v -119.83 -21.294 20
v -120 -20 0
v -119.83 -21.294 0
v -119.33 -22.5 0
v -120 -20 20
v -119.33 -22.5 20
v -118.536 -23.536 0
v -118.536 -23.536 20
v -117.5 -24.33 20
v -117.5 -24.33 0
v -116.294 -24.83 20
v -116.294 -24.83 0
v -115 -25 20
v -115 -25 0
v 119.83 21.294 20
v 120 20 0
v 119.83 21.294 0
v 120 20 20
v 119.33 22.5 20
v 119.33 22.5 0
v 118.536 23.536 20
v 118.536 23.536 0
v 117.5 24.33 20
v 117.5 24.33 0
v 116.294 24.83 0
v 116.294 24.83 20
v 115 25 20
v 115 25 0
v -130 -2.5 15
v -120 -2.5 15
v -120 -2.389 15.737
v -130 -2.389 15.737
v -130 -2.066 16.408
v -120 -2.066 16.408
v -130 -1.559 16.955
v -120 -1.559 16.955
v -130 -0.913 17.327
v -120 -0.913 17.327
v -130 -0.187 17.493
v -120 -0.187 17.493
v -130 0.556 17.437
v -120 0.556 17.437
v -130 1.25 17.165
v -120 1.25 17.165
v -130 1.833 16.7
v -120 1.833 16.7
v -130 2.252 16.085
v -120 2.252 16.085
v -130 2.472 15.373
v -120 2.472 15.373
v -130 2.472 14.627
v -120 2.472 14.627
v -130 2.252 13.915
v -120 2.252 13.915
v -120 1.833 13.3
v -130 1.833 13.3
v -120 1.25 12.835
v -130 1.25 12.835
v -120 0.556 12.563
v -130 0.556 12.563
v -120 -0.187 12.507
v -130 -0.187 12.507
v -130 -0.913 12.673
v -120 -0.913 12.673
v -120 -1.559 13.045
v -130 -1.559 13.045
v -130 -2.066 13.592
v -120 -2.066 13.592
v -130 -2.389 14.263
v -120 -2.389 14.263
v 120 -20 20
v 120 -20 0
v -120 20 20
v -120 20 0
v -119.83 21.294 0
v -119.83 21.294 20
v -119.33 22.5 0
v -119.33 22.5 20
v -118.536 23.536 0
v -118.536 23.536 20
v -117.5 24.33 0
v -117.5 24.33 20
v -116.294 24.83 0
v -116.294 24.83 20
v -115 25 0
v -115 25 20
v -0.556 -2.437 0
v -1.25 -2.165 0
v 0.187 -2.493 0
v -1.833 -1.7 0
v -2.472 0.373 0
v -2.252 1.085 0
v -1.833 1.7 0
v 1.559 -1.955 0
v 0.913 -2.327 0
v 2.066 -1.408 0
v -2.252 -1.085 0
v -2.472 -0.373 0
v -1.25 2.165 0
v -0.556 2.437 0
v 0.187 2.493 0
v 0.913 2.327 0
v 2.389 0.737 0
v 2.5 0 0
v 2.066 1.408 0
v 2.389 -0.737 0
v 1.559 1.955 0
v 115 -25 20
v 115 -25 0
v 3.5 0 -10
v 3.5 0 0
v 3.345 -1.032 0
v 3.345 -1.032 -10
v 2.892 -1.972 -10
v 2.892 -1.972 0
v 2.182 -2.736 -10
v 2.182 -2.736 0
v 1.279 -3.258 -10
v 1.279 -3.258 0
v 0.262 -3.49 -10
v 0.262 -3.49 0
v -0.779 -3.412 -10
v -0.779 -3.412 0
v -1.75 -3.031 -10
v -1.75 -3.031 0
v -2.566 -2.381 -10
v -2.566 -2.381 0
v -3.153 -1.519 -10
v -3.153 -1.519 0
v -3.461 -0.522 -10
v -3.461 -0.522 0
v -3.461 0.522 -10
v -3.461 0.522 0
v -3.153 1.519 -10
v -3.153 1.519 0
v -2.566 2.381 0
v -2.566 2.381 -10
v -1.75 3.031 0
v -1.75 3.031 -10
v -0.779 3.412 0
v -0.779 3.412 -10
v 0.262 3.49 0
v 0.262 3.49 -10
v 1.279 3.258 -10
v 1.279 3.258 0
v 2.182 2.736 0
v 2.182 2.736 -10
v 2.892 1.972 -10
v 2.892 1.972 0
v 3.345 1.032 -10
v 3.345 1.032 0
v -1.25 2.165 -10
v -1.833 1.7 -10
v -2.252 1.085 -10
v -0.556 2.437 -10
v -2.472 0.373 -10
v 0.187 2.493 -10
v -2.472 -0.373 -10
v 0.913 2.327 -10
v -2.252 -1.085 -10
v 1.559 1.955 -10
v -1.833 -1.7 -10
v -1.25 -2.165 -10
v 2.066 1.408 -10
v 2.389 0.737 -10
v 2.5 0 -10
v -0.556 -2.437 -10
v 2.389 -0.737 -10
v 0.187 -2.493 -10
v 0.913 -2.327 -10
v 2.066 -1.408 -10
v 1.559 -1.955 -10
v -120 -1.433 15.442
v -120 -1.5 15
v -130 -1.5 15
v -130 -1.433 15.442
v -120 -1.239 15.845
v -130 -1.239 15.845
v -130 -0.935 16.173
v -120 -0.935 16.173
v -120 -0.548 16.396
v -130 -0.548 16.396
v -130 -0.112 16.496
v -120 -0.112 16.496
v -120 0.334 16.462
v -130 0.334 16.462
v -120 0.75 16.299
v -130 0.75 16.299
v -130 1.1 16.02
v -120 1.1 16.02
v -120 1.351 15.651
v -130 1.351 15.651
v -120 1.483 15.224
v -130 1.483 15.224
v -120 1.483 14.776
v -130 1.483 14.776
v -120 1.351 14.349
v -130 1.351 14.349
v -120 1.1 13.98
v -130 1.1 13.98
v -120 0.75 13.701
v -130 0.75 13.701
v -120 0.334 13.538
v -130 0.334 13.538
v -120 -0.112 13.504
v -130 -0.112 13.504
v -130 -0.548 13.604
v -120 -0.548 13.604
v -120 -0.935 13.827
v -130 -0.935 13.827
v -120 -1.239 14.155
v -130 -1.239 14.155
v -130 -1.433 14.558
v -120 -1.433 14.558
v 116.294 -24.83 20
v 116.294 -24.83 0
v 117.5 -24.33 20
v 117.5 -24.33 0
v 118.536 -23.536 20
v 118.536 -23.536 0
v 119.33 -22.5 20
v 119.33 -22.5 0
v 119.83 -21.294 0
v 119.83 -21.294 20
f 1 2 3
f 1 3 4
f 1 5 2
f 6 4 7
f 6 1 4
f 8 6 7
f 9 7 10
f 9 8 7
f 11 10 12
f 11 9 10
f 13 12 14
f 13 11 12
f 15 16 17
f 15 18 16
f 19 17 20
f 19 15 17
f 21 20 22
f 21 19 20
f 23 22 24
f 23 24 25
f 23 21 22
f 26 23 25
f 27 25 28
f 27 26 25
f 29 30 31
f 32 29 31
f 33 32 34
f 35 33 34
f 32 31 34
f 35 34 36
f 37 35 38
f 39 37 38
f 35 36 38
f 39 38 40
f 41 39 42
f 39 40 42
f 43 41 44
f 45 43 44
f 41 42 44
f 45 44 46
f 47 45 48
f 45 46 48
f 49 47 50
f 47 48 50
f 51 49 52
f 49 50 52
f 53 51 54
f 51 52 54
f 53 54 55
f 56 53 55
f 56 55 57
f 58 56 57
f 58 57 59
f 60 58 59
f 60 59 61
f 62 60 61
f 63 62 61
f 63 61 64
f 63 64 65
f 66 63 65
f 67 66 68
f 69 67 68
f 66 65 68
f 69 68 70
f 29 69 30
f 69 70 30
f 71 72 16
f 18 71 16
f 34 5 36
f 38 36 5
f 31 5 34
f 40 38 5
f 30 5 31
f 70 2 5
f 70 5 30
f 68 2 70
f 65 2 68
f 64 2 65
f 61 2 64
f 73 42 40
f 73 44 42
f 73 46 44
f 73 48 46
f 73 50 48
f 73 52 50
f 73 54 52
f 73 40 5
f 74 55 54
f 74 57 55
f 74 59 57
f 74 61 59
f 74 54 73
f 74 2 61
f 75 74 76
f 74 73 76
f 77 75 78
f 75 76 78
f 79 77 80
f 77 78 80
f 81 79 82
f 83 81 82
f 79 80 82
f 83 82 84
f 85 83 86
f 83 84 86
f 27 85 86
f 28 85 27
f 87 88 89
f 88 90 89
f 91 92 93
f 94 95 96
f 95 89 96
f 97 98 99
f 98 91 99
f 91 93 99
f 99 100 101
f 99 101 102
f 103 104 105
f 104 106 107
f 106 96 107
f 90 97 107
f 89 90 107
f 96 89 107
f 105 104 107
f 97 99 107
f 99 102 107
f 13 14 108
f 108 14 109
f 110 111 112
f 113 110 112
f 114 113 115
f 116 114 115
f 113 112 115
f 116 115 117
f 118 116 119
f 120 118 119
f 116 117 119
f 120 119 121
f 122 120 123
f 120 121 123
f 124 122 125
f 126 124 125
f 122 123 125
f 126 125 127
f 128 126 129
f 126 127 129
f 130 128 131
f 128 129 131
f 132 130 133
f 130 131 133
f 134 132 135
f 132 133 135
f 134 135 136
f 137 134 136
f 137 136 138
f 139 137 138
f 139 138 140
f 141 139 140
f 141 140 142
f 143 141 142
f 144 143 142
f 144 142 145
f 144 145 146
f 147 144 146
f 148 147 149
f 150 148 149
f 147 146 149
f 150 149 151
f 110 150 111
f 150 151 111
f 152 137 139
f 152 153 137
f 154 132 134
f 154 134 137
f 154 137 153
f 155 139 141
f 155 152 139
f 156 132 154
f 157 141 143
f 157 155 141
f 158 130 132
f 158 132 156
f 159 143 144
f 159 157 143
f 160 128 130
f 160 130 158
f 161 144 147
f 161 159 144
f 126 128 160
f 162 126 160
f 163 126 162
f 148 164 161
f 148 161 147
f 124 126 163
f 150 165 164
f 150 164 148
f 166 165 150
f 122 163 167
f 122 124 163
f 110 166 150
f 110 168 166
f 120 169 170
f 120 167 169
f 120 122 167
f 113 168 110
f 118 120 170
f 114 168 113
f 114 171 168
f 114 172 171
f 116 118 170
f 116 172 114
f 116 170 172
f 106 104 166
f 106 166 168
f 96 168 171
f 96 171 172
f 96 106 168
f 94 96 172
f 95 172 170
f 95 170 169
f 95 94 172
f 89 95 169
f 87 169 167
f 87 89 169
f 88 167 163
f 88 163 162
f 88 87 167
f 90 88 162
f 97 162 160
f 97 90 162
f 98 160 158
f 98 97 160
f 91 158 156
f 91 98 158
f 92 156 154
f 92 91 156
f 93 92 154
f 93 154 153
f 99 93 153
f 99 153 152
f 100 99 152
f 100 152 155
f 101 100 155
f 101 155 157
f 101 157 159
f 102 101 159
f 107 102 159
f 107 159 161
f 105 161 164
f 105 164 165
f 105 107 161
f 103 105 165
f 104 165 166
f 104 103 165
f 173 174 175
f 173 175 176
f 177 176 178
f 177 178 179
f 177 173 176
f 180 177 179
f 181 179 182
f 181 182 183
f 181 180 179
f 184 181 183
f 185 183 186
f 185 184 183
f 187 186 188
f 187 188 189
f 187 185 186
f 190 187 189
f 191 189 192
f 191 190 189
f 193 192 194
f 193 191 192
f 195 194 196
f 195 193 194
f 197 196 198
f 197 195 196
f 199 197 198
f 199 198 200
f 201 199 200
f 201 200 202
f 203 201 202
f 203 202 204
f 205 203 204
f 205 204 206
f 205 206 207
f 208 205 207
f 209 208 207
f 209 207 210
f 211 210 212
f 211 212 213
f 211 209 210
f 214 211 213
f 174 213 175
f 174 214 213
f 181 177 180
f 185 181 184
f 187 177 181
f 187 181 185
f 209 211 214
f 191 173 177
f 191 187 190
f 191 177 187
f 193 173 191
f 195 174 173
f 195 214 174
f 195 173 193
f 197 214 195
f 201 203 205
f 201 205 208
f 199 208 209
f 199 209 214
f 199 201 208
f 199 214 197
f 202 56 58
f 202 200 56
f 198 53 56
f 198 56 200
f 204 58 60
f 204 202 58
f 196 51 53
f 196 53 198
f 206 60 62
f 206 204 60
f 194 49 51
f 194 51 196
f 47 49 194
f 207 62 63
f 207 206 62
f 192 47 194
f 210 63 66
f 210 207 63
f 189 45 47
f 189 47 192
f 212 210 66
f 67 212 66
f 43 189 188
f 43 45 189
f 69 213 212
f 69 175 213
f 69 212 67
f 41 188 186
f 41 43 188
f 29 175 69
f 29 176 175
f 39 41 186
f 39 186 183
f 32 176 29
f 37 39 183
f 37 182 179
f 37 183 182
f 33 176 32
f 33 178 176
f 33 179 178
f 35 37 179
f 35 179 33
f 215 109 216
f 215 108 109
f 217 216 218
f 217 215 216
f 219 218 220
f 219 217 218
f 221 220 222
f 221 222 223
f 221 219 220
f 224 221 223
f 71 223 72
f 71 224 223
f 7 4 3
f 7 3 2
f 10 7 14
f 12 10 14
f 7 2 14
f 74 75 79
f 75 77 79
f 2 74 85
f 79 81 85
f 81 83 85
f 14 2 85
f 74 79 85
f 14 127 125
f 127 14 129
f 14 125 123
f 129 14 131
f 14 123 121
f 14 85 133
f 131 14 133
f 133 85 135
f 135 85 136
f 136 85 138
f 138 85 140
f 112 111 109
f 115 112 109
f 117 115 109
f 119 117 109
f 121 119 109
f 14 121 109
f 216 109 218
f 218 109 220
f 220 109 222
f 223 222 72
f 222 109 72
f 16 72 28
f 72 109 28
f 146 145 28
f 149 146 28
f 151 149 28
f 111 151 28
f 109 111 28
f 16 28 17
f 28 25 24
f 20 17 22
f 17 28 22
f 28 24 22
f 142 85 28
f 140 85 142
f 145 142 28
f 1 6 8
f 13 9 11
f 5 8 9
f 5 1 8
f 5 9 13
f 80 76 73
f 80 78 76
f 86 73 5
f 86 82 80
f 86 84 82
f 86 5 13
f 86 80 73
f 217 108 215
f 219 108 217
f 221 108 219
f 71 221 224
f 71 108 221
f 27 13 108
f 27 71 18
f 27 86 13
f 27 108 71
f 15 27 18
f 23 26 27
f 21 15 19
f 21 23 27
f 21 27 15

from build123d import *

# Parameters (mm, degrees)
F0_W     = 240
F0_H     = 50
F0_R     = 3.5
F1_DEPTH = 20
F2_R     = 5
F4_R     = 3.5
F4_R_2   = 2.5
F5_DEPTH = 10
F3_R     = 2.5
F3_R_2   = 1.5
F6_DEPTH = 10


with BuildPart() as f1:
    # F0 (on Top) → F1 (new body)
    with BuildSketch(Plane.XY):
        Rectangle(F0_W, F0_H)
        Circle(F0_R, mode=Mode.SUBTRACT)
        Circle(F0_R)
    extrude(amount=F1_DEPTH)

    # F2
    f2_edges = [f1.edges().sort_by_distance(p)[0] for p in [
        (-120, -25, 10),
        (120, -25, 10),
        (120, 25, 10),
        (-120, 25, 10),
    ]]
    fillet(f2_edges, radius=F2_R)

    # F4 (on face) → F5 (join)
    with BuildSketch(Plane(origin=(0, 0, 0), x_dir=(1, 0, 0), z_dir=(0, 0, -1))):
        Circle(F4_R)
        Circle(F4_R_2, mode=Mode.SUBTRACT)
    extrude(amount=F5_DEPTH)

    # F3 (on face) → F6 (join)
    with BuildSketch(Plane(origin=(-120, 0, 0), x_dir=(0, -1, 0), z_dir=(-1, 0, 0))):
        with Locations((0, 15)):
            Circle(F3_R)
        with Locations((0, 15)):
            Circle(F3_R_2, mode=Mode.SUBTRACT)
    extrude(amount=F6_DEPTH)


solid = f1.part
